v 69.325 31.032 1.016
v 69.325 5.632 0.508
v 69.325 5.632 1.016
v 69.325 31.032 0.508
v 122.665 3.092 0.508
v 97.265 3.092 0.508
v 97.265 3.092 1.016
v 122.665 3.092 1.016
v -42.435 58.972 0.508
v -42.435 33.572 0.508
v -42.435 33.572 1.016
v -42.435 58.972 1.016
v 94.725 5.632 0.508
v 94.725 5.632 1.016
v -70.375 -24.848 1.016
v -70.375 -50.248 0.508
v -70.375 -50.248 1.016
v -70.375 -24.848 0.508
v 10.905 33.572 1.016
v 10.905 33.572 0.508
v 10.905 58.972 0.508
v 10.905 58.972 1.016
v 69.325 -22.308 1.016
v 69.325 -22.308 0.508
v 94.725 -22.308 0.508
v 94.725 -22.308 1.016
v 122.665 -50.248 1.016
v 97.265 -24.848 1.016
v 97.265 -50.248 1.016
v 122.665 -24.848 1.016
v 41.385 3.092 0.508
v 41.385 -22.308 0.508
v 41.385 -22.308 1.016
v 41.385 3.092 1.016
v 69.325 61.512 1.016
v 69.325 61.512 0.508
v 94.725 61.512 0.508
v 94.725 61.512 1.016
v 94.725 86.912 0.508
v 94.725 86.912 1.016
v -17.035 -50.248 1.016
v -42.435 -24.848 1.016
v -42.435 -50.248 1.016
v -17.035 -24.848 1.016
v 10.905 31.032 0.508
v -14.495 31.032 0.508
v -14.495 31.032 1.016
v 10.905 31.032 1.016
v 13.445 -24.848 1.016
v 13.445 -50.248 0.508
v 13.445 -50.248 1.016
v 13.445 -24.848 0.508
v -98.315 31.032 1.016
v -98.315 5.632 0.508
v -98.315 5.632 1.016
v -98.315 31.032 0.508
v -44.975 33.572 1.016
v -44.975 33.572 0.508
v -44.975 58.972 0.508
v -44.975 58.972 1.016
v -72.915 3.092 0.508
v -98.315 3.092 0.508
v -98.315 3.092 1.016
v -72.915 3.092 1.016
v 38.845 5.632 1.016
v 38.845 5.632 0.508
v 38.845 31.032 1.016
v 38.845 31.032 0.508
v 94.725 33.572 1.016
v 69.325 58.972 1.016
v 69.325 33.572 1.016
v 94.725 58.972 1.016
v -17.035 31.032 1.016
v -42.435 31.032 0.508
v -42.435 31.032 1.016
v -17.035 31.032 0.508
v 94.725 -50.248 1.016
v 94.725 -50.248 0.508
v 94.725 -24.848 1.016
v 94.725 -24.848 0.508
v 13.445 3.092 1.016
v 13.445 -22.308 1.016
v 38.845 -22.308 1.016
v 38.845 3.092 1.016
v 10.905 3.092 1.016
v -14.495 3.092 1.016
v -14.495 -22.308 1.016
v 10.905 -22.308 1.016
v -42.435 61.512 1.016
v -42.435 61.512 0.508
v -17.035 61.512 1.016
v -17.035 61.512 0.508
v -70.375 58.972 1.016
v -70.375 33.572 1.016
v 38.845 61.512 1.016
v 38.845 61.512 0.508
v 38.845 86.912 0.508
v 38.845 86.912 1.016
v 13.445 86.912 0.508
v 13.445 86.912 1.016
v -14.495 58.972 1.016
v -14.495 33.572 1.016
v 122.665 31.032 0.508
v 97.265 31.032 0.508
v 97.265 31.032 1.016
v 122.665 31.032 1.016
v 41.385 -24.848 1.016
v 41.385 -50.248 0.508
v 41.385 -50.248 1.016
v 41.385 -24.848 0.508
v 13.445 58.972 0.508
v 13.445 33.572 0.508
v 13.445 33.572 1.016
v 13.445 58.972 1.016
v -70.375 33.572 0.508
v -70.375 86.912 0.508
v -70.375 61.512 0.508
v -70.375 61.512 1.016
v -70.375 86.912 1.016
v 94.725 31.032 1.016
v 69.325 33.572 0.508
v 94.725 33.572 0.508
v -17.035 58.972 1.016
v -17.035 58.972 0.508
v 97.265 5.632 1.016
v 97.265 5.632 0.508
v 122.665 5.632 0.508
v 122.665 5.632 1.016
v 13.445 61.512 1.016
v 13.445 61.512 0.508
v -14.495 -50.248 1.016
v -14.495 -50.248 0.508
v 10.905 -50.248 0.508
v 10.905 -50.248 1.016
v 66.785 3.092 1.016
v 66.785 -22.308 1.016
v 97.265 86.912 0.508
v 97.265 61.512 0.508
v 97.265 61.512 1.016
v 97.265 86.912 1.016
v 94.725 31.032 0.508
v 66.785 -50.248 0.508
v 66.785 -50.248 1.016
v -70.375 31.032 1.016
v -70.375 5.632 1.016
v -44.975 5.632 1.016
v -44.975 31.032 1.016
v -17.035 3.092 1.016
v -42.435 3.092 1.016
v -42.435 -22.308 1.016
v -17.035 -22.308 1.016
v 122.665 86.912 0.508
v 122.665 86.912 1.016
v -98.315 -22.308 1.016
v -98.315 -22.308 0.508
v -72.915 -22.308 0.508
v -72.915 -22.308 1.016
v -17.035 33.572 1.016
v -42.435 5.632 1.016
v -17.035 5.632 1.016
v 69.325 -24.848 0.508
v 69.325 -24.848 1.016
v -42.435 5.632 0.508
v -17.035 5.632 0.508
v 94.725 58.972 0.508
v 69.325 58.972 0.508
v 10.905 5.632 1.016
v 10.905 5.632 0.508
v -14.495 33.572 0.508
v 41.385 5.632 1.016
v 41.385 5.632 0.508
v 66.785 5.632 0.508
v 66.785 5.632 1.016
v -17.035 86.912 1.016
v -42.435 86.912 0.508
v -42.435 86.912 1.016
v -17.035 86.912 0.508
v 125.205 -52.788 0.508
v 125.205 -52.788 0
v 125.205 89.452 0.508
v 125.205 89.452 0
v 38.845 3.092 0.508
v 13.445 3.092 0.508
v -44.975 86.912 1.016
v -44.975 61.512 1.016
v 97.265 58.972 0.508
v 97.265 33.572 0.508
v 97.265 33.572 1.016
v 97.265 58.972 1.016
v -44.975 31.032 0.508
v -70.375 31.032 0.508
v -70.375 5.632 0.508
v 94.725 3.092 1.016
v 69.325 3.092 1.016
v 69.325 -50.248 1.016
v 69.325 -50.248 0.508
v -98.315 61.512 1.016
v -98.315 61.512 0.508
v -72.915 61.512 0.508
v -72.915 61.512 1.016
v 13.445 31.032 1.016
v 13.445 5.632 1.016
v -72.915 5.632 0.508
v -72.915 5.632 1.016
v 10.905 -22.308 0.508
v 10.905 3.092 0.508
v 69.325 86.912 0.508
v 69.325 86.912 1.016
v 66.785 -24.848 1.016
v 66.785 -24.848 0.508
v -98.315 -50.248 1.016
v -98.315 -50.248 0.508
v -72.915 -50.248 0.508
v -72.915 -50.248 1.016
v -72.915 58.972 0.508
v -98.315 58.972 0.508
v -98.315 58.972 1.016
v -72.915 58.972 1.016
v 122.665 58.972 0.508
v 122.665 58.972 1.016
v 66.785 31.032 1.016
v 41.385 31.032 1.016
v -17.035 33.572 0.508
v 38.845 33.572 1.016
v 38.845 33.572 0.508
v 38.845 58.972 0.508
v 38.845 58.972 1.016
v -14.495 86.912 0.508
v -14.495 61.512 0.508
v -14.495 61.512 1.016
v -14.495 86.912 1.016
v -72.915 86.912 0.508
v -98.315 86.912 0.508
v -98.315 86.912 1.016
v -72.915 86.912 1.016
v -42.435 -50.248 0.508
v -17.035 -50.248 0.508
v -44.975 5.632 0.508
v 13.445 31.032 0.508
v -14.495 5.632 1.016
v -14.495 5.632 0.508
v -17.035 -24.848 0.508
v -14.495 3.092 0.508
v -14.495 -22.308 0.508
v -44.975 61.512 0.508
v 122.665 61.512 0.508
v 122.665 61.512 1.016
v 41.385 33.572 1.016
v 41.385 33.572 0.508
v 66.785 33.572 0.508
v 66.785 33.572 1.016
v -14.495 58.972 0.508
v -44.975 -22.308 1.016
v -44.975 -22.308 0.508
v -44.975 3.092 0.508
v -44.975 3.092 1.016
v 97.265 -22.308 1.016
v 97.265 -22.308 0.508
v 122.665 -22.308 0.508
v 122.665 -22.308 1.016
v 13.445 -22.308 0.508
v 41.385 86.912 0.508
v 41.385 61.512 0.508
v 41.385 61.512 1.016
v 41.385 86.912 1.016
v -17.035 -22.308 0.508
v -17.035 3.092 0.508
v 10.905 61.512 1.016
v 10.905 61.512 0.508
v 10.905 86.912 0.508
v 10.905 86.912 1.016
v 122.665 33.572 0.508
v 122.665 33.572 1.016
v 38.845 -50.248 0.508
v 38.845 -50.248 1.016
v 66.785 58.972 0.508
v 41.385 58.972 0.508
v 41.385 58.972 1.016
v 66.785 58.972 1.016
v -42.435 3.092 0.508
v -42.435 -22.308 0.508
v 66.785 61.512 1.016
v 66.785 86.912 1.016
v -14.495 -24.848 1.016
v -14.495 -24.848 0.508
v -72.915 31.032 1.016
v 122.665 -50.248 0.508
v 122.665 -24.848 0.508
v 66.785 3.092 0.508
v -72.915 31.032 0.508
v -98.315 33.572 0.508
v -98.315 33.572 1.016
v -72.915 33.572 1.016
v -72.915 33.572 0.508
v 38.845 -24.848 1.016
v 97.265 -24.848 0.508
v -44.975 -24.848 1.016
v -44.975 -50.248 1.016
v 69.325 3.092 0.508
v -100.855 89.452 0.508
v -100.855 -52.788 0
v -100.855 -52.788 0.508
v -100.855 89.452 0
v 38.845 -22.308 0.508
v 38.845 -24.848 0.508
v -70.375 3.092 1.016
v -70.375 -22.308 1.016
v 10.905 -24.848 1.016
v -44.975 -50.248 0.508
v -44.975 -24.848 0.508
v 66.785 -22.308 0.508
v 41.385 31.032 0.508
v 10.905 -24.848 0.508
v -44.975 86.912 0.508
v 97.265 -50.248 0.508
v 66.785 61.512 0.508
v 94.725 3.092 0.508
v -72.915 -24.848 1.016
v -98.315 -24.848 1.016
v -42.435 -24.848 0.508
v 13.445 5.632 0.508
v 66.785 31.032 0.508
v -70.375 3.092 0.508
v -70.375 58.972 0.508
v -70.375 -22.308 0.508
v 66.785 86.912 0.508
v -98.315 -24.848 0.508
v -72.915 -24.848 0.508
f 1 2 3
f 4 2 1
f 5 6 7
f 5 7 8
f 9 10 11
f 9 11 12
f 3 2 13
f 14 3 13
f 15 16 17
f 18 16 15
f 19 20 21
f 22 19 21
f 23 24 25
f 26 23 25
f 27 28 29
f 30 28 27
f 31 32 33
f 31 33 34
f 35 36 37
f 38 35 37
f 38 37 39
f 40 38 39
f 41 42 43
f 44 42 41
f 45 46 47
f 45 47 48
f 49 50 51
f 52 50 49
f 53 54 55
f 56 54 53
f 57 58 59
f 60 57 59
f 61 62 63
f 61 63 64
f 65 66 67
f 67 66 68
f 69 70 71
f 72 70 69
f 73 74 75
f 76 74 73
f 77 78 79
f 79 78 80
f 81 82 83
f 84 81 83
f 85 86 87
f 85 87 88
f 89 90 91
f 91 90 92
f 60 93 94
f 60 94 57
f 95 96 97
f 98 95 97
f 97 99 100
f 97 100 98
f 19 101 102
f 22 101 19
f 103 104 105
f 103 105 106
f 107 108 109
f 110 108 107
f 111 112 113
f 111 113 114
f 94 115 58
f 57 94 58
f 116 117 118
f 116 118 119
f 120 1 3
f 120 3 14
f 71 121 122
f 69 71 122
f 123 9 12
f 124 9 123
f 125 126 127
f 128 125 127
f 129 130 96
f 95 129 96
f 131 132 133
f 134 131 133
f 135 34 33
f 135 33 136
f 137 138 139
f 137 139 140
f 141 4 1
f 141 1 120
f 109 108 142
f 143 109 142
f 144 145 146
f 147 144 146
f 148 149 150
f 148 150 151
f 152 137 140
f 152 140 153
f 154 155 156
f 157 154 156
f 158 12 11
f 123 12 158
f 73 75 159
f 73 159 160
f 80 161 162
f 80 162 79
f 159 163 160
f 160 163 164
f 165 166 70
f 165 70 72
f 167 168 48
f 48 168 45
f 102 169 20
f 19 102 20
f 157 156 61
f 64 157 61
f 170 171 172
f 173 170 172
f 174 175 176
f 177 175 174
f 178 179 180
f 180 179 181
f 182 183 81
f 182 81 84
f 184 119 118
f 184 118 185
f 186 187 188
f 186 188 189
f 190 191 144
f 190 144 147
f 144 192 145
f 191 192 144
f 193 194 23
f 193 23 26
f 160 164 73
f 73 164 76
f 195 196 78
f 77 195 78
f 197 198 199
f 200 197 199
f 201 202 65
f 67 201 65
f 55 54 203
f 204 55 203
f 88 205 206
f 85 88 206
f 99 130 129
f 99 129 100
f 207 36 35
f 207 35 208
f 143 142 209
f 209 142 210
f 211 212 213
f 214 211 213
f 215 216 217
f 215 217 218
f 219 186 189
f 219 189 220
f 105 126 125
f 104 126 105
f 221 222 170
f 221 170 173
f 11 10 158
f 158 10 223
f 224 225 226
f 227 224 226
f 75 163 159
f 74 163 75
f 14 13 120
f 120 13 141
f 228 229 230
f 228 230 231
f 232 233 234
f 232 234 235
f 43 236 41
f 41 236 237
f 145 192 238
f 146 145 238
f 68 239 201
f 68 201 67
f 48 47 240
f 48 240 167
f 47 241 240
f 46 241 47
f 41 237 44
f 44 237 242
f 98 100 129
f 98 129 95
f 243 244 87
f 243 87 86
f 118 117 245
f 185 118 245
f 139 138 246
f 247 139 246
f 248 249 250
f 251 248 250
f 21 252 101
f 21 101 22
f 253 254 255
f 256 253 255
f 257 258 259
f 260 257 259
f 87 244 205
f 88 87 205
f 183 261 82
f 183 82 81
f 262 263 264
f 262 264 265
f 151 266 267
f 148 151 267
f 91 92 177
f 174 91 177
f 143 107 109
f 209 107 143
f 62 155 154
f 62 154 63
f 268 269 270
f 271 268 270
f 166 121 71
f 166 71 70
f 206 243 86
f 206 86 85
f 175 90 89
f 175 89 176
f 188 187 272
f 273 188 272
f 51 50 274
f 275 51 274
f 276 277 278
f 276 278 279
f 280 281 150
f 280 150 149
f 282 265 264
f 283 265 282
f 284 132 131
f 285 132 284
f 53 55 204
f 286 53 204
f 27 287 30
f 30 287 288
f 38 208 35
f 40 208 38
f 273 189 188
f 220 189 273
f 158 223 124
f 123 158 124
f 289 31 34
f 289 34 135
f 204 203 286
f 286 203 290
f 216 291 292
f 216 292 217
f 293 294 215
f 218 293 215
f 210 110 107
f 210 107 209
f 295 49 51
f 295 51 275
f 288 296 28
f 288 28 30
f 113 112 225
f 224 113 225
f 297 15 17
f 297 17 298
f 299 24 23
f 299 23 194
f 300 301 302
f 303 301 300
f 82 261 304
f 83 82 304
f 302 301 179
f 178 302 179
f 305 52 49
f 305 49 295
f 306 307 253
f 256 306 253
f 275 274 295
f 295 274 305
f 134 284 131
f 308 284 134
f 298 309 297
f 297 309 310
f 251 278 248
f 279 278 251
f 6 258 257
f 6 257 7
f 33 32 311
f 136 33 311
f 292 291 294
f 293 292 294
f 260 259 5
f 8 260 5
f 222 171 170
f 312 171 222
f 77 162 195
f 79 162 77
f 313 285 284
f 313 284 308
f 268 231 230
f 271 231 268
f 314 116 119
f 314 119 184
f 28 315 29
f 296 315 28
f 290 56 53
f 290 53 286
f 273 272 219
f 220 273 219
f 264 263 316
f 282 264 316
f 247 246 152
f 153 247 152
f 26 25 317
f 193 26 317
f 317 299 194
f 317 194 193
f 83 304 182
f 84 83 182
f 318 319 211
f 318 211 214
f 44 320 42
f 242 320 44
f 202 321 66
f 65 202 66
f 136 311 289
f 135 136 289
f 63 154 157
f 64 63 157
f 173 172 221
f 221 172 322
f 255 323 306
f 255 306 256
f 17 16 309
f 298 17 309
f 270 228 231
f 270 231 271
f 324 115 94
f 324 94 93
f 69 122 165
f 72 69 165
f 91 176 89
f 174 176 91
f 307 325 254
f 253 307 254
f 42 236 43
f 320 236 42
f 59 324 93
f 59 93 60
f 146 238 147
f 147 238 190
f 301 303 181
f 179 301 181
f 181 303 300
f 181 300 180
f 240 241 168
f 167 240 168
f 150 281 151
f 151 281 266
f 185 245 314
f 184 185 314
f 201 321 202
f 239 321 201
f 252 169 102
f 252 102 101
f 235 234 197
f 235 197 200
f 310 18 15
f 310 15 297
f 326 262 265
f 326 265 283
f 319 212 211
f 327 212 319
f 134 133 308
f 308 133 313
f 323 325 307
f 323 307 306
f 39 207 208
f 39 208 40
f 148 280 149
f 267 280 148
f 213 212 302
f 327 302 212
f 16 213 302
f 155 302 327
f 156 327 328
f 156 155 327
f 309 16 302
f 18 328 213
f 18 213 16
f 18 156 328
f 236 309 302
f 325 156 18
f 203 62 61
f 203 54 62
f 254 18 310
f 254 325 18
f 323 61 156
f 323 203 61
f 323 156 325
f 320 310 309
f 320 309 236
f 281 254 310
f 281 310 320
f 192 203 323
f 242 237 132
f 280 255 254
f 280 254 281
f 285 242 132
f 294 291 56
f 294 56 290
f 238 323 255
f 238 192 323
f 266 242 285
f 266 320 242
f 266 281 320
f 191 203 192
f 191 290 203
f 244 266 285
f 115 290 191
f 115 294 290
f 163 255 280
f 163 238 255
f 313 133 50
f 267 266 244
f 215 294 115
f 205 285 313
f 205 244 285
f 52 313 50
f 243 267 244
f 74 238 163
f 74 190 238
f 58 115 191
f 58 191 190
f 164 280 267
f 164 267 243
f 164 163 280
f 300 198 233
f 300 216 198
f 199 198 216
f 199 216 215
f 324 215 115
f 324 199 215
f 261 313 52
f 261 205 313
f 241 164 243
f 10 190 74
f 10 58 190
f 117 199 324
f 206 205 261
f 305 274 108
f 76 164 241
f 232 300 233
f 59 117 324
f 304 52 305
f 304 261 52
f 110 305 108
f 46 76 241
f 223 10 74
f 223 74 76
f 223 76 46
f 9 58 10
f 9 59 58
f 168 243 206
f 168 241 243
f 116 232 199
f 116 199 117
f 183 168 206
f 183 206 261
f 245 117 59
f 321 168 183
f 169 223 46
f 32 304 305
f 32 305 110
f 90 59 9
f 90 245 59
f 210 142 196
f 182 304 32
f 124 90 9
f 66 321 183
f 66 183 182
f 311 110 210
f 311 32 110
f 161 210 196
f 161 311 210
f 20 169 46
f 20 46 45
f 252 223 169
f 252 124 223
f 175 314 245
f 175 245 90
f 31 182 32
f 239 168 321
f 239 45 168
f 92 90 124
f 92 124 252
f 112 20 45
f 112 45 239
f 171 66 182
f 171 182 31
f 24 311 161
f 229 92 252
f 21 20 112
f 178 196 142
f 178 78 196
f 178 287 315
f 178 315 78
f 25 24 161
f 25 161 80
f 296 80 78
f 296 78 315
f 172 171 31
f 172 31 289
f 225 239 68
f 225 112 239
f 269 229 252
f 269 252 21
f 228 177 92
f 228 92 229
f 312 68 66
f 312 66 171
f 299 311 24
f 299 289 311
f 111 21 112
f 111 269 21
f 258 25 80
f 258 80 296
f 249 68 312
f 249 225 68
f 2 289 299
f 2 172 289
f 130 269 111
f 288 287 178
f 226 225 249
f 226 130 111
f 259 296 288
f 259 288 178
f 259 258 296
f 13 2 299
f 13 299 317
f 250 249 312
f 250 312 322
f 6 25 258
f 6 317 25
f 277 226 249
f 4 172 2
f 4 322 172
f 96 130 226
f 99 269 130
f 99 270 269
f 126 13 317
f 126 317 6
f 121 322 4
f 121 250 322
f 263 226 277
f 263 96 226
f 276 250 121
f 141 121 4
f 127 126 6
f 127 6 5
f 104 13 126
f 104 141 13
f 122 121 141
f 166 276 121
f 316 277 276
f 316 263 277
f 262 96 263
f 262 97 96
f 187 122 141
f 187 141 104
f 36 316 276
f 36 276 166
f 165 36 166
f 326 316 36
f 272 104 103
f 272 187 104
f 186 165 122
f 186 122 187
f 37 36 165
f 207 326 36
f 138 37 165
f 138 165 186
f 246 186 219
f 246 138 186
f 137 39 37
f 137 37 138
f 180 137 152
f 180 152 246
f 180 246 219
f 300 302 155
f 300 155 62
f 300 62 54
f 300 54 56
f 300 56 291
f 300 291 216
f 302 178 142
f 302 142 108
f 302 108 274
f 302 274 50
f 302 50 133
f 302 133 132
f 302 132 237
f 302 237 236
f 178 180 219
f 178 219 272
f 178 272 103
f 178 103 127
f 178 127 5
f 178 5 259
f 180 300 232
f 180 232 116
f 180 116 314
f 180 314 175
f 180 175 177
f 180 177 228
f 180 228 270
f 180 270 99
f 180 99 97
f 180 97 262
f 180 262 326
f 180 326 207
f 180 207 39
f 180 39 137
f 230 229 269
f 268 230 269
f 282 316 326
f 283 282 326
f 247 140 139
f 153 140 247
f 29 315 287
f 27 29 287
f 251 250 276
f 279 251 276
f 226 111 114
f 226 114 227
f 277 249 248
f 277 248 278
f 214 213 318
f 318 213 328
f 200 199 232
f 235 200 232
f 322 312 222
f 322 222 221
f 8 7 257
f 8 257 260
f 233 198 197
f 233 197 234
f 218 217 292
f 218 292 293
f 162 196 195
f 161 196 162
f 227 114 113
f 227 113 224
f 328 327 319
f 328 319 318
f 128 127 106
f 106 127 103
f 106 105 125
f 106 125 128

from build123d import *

# Parameters (mm, degrees)
F0_W     = 226.06
F0_H     = 142.24
F0_W_2   = 25.4
F0_H_2   = 25.4
F1_DEPTH = 0.508
F2_DEPTH = 1.016


with BuildPart() as f1:
    # F0 (on Top) → F1 (new body)
    with BuildSketch(Plane.XY):
        with Locations((12.174503, 18.332164)):
            Rectangle(F0_W, F0_H)
        with Locations((-85.615497, -37.547836)):
            Rectangle(F0_W_2, F0_H_2, mode=Mode.SUBTRACT)
        with Locations((-57.675497, -37.547836)):
            Rectangle(F0_W_2, F0_H_2, mode=Mode.SUBTRACT)
        with Locations((-29.735497, -37.547836)):
            Rectangle(F0_W_2, F0_H_2, mode=Mode.SUBTRACT)
        with Locations((-1.795497, -37.547836)):
            Rectangle(F0_W_2, F0_H_2, mode=Mode.SUBTRACT)
        with Locations((-85.615497, -9.607836)):
            Rectangle(F0_W_2, F0_H_2, mode=Mode.SUBTRACT)
        with Locations((-57.675497, -9.607836)):
            Rectangle(F0_W_2, F0_H_2, mode=Mode.SUBTRACT)
        with Locations((-85.615497, 18.332164)):
            Rectangle(F0_W_2, F0_H_2, mode=Mode.SUBTRACT)
        with Locations((-57.675497, 18.332164)):
            Rectangle(F0_W_2, F0_H_2, mode=Mode.SUBTRACT)
        with Locations((-29.735497, -9.607836)):
            Rectangle(F0_W_2, F0_H_2, mode=Mode.SUBTRACT)
        with Locations((-1.795497, -9.607836)):
            Rectangle(F0_W_2, F0_H_2, mode=Mode.SUBTRACT)
        with Locations((-29.735497, 18.332164)):
            Rectangle(F0_W_2, F0_H_2, mode=Mode.SUBTRACT)
        with Locations((-1.795497, 18.332164)):
            Rectangle(F0_W_2, F0_H_2, mode=Mode.SUBTRACT)
        with Locations((26.144503, -37.547836)):
            Rectangle(F0_W_2, F0_H_2, mode=Mode.SUBTRACT)
        with Locations((54.084503, -37.547836)):
            Rectangle(F0_W_2, F0_H_2, mode=Mode.SUBTRACT)
        with Locations((82.024503, -37.547836)):
            Rectangle(F0_W_2, F0_H_2, mode=Mode.SUBTRACT)
        with Locations((109.964503, -37.547836)):
            Rectangle(F0_W_2, F0_H_2, mode=Mode.SUBTRACT)
        with Locations((26.144503, -9.607836)):
            Rectangle(F0_W_2, F0_H_2, mode=Mode.SUBTRACT)
        with Locations((54.084503, -9.607836)):
            Rectangle(F0_W_2, F0_H_2, mode=Mode.SUBTRACT)
        with Locations((26.144503, 18.332164)):
            Rectangle(F0_W_2, F0_H_2, mode=Mode.SUBTRACT)
        with Locations((54.084503, 18.332164)):
            Rectangle(F0_W_2, F0_H_2, mode=Mode.SUBTRACT)
        with Locations((82.024503, -9.607836)):
            Rectangle(F0_W_2, F0_H_2, mode=Mode.SUBTRACT)
        with Locations((109.964503, -9.607836)):
            Rectangle(F0_W_2, F0_H_2, mode=Mode.SUBTRACT)
        with Locations((82.024503, 18.332164)):
            Rectangle(F0_W_2, F0_H_2, mode=Mode.SUBTRACT)
        with Locations((109.964503, 18.332164)):
            Rectangle(F0_W_2, F0_H_2, mode=Mode.SUBTRACT)
        with Locations((-85.615497, 46.272164)):
            Rectangle(F0_W_2, F0_H_2, mode=Mode.SUBTRACT)
        with Locations((-57.675497, 46.272164)):
            Rectangle(F0_W_2, F0_H_2, mode=Mode.SUBTRACT)
        with Locations((-29.735497, 46.272164)):
            Rectangle(F0_W_2, F0_H_2, mode=Mode.SUBTRACT)
        with Locations((-1.795497, 46.272164)):
            Rectangle(F0_W_2, F0_H_2, mode=Mode.SUBTRACT)
        with Locations((-85.615497, 74.212164)):
            Rectangle(F0_W_2, F0_H_2, mode=Mode.SUBTRACT)
        with Locations((-57.675497, 74.212164)):
            Rectangle(F0_W_2, F0_H_2, mode=Mode.SUBTRACT)
        with Locations((-29.735497, 74.212164)):
            Rectangle(F0_W_2, F0_H_2, mode=Mode.SUBTRACT)
        with Locations((-1.795497, 74.212164)):
            Rectangle(F0_W_2, F0_H_2, mode=Mode.SUBTRACT)
        with Locations((26.144503, 46.272164)):
            Rectangle(F0_W_2, F0_H_2, mode=Mode.SUBTRACT)
        with Locations((54.084503, 46.272164)):
            Rectangle(F0_W_2, F0_H_2, mode=Mode.SUBTRACT)
        with Locations((82.024503, 46.272164)):
            Rectangle(F0_W_2, F0_H_2, mode=Mode.SUBTRACT)
        with Locations((109.964503, 46.272164)):
            Rectangle(F0_W_2, F0_H_2, mode=Mode.SUBTRACT)
        with Locations((26.144503, 74.212164)):
            Rectangle(F0_W_2, F0_H_2, mode=Mode.SUBTRACT)
        with Locations((54.084503, 74.212164)):
            Rectangle(F0_W_2, F0_H_2, mode=Mode.SUBTRACT)
        with Locations((82.024503, 74.212164)):
            Rectangle(F0_W_2, F0_H_2, mode=Mode.SUBTRACT)
        with Locations((109.964503, 74.212164)):
            Rectangle(F0_W_2, F0_H_2, mode=Mode.SUBTRACT)
    extrude(amount=F1_DEPTH)

    # F0 (on Top) → F2 (join)
    with BuildSketch(Plane.XY):
        with Locations((-85.615497, 18.332164)):
            Rectangle(F0_W_2, F0_H_2)
        with Locations((-57.675497, 18.332164)):
            Rectangle(F0_W_2, F0_H_2)
        with Locations((-57.675497, 46.272164)):
            Rectangle(F0_W_2, F0_H_2)
        with Locations((-85.615497, 46.272164)):
            Rectangle(F0_W_2, F0_H_2)
        with Locations((-85.615497, 74.212164)):
            Rectangle(F0_W_2, F0_H_2)
        with Locations((-57.675497, 74.212164)):
            Rectangle(F0_W_2, F0_H_2)
        with Locations((-85.615497, -9.607836)):
            Rectangle(F0_W_2, F0_H_2)
        with Locations((-57.675497, -9.607836)):
            Rectangle(F0_W_2, F0_H_2)
        with Locations((-57.675497, -37.547836)):
            Rectangle(F0_W_2, F0_H_2)
        with Locations((-85.615497, -37.547836)):
            Rectangle(F0_W_2, F0_H_2)
        with Locations((-29.735497, -37.547836)):
            Rectangle(F0_W_2, F0_H_2)
        with Locations((-29.735497, -9.607836)):
            Rectangle(F0_W_2, F0_H_2)
        with Locations((-29.735497, 18.332164)):
            Rectangle(F0_W_2, F0_H_2)
        with Locations((-29.735497, 46.272164)):
            Rectangle(F0_W_2, F0_H_2)
        with Locations((-29.735497, 74.212164)):
            Rectangle(F0_W_2, F0_H_2)
        with Locations((-1.795497, 74.212164)):
            Rectangle(F0_W_2, F0_H_2)
        with Locations((-1.795497, 46.272164)):
            Rectangle(F0_W_2, F0_H_2)
        with Locations((-1.795497, 18.332164)):
            Rectangle(F0_W_2, F0_H_2)
        with Locations((-1.795497, -9.607836)):
            Rectangle(F0_W_2, F0_H_2)
        with Locations((-1.795497, -37.547836)):
            Rectangle(F0_W_2, F0_H_2)
        with Locations((26.144503, -37.547836)):
            Rectangle(F0_W_2, F0_H_2)
        with Locations((26.144503, -9.607836)):
            Rectangle(F0_W_2, F0_H_2)
        with Locations((26.144503, 18.332164)):
            Rectangle(F0_W_2, F0_H_2)
        with Locations((26.144503, 46.272164)):
            Rectangle(F0_W_2, F0_H_2)
        with Locations((26.144503, 74.212164)):
            Rectangle(F0_W_2, F0_H_2)
        with Locations((54.084503, 74.212164)):
            Rectangle(F0_W_2, F0_H_2)
        with Locations((54.084503, 46.272164)):
            Rectangle(F0_W_2, F0_H_2)
        with Locations((54.084503, 18.332164)):
            Rectangle(F0_W_2, F0_H_2)
        with Locations((54.084503, -9.607836)):
            Rectangle(F0_W_2, F0_H_2)
        with Locations((54.084503, -37.547836)):
            Rectangle(F0_W_2, F0_H_2)
        with Locations((82.024503, -37.547836)):
            Rectangle(F0_W_2, F0_H_2)
        with Locations((82.024503, -9.607836)):
            Rectangle(F0_W_2, F0_H_2)
        with Locations((82.024503, 18.332164)):
            Rectangle(F0_W_2, F0_H_2)
        with Locations((82.024503, 46.272164)):
            Rectangle(F0_W_2, F0_H_2)
        with Locations((82.024503, 74.212164)):
            Rectangle(F0_W_2, F0_H_2)
        with Locations((109.964503, 74.212164)):
            Rectangle(F0_W_2, F0_H_2)
        with Locations((109.964503, 46.272164)):
            Rectangle(F0_W_2, F0_H_2)
        with Locations((109.964503, 18.332164)):
            Rectangle(F0_W_2, F0_H_2)
        with Locations((109.964503, -9.607836)):
            Rectangle(F0_W_2, F0_H_2)
        with Locations((109.964503, -37.547836)):
            Rectangle(F0_W_2, F0_H_2)
    extrude(amount=F2_DEPTH)


solid = f1.part
